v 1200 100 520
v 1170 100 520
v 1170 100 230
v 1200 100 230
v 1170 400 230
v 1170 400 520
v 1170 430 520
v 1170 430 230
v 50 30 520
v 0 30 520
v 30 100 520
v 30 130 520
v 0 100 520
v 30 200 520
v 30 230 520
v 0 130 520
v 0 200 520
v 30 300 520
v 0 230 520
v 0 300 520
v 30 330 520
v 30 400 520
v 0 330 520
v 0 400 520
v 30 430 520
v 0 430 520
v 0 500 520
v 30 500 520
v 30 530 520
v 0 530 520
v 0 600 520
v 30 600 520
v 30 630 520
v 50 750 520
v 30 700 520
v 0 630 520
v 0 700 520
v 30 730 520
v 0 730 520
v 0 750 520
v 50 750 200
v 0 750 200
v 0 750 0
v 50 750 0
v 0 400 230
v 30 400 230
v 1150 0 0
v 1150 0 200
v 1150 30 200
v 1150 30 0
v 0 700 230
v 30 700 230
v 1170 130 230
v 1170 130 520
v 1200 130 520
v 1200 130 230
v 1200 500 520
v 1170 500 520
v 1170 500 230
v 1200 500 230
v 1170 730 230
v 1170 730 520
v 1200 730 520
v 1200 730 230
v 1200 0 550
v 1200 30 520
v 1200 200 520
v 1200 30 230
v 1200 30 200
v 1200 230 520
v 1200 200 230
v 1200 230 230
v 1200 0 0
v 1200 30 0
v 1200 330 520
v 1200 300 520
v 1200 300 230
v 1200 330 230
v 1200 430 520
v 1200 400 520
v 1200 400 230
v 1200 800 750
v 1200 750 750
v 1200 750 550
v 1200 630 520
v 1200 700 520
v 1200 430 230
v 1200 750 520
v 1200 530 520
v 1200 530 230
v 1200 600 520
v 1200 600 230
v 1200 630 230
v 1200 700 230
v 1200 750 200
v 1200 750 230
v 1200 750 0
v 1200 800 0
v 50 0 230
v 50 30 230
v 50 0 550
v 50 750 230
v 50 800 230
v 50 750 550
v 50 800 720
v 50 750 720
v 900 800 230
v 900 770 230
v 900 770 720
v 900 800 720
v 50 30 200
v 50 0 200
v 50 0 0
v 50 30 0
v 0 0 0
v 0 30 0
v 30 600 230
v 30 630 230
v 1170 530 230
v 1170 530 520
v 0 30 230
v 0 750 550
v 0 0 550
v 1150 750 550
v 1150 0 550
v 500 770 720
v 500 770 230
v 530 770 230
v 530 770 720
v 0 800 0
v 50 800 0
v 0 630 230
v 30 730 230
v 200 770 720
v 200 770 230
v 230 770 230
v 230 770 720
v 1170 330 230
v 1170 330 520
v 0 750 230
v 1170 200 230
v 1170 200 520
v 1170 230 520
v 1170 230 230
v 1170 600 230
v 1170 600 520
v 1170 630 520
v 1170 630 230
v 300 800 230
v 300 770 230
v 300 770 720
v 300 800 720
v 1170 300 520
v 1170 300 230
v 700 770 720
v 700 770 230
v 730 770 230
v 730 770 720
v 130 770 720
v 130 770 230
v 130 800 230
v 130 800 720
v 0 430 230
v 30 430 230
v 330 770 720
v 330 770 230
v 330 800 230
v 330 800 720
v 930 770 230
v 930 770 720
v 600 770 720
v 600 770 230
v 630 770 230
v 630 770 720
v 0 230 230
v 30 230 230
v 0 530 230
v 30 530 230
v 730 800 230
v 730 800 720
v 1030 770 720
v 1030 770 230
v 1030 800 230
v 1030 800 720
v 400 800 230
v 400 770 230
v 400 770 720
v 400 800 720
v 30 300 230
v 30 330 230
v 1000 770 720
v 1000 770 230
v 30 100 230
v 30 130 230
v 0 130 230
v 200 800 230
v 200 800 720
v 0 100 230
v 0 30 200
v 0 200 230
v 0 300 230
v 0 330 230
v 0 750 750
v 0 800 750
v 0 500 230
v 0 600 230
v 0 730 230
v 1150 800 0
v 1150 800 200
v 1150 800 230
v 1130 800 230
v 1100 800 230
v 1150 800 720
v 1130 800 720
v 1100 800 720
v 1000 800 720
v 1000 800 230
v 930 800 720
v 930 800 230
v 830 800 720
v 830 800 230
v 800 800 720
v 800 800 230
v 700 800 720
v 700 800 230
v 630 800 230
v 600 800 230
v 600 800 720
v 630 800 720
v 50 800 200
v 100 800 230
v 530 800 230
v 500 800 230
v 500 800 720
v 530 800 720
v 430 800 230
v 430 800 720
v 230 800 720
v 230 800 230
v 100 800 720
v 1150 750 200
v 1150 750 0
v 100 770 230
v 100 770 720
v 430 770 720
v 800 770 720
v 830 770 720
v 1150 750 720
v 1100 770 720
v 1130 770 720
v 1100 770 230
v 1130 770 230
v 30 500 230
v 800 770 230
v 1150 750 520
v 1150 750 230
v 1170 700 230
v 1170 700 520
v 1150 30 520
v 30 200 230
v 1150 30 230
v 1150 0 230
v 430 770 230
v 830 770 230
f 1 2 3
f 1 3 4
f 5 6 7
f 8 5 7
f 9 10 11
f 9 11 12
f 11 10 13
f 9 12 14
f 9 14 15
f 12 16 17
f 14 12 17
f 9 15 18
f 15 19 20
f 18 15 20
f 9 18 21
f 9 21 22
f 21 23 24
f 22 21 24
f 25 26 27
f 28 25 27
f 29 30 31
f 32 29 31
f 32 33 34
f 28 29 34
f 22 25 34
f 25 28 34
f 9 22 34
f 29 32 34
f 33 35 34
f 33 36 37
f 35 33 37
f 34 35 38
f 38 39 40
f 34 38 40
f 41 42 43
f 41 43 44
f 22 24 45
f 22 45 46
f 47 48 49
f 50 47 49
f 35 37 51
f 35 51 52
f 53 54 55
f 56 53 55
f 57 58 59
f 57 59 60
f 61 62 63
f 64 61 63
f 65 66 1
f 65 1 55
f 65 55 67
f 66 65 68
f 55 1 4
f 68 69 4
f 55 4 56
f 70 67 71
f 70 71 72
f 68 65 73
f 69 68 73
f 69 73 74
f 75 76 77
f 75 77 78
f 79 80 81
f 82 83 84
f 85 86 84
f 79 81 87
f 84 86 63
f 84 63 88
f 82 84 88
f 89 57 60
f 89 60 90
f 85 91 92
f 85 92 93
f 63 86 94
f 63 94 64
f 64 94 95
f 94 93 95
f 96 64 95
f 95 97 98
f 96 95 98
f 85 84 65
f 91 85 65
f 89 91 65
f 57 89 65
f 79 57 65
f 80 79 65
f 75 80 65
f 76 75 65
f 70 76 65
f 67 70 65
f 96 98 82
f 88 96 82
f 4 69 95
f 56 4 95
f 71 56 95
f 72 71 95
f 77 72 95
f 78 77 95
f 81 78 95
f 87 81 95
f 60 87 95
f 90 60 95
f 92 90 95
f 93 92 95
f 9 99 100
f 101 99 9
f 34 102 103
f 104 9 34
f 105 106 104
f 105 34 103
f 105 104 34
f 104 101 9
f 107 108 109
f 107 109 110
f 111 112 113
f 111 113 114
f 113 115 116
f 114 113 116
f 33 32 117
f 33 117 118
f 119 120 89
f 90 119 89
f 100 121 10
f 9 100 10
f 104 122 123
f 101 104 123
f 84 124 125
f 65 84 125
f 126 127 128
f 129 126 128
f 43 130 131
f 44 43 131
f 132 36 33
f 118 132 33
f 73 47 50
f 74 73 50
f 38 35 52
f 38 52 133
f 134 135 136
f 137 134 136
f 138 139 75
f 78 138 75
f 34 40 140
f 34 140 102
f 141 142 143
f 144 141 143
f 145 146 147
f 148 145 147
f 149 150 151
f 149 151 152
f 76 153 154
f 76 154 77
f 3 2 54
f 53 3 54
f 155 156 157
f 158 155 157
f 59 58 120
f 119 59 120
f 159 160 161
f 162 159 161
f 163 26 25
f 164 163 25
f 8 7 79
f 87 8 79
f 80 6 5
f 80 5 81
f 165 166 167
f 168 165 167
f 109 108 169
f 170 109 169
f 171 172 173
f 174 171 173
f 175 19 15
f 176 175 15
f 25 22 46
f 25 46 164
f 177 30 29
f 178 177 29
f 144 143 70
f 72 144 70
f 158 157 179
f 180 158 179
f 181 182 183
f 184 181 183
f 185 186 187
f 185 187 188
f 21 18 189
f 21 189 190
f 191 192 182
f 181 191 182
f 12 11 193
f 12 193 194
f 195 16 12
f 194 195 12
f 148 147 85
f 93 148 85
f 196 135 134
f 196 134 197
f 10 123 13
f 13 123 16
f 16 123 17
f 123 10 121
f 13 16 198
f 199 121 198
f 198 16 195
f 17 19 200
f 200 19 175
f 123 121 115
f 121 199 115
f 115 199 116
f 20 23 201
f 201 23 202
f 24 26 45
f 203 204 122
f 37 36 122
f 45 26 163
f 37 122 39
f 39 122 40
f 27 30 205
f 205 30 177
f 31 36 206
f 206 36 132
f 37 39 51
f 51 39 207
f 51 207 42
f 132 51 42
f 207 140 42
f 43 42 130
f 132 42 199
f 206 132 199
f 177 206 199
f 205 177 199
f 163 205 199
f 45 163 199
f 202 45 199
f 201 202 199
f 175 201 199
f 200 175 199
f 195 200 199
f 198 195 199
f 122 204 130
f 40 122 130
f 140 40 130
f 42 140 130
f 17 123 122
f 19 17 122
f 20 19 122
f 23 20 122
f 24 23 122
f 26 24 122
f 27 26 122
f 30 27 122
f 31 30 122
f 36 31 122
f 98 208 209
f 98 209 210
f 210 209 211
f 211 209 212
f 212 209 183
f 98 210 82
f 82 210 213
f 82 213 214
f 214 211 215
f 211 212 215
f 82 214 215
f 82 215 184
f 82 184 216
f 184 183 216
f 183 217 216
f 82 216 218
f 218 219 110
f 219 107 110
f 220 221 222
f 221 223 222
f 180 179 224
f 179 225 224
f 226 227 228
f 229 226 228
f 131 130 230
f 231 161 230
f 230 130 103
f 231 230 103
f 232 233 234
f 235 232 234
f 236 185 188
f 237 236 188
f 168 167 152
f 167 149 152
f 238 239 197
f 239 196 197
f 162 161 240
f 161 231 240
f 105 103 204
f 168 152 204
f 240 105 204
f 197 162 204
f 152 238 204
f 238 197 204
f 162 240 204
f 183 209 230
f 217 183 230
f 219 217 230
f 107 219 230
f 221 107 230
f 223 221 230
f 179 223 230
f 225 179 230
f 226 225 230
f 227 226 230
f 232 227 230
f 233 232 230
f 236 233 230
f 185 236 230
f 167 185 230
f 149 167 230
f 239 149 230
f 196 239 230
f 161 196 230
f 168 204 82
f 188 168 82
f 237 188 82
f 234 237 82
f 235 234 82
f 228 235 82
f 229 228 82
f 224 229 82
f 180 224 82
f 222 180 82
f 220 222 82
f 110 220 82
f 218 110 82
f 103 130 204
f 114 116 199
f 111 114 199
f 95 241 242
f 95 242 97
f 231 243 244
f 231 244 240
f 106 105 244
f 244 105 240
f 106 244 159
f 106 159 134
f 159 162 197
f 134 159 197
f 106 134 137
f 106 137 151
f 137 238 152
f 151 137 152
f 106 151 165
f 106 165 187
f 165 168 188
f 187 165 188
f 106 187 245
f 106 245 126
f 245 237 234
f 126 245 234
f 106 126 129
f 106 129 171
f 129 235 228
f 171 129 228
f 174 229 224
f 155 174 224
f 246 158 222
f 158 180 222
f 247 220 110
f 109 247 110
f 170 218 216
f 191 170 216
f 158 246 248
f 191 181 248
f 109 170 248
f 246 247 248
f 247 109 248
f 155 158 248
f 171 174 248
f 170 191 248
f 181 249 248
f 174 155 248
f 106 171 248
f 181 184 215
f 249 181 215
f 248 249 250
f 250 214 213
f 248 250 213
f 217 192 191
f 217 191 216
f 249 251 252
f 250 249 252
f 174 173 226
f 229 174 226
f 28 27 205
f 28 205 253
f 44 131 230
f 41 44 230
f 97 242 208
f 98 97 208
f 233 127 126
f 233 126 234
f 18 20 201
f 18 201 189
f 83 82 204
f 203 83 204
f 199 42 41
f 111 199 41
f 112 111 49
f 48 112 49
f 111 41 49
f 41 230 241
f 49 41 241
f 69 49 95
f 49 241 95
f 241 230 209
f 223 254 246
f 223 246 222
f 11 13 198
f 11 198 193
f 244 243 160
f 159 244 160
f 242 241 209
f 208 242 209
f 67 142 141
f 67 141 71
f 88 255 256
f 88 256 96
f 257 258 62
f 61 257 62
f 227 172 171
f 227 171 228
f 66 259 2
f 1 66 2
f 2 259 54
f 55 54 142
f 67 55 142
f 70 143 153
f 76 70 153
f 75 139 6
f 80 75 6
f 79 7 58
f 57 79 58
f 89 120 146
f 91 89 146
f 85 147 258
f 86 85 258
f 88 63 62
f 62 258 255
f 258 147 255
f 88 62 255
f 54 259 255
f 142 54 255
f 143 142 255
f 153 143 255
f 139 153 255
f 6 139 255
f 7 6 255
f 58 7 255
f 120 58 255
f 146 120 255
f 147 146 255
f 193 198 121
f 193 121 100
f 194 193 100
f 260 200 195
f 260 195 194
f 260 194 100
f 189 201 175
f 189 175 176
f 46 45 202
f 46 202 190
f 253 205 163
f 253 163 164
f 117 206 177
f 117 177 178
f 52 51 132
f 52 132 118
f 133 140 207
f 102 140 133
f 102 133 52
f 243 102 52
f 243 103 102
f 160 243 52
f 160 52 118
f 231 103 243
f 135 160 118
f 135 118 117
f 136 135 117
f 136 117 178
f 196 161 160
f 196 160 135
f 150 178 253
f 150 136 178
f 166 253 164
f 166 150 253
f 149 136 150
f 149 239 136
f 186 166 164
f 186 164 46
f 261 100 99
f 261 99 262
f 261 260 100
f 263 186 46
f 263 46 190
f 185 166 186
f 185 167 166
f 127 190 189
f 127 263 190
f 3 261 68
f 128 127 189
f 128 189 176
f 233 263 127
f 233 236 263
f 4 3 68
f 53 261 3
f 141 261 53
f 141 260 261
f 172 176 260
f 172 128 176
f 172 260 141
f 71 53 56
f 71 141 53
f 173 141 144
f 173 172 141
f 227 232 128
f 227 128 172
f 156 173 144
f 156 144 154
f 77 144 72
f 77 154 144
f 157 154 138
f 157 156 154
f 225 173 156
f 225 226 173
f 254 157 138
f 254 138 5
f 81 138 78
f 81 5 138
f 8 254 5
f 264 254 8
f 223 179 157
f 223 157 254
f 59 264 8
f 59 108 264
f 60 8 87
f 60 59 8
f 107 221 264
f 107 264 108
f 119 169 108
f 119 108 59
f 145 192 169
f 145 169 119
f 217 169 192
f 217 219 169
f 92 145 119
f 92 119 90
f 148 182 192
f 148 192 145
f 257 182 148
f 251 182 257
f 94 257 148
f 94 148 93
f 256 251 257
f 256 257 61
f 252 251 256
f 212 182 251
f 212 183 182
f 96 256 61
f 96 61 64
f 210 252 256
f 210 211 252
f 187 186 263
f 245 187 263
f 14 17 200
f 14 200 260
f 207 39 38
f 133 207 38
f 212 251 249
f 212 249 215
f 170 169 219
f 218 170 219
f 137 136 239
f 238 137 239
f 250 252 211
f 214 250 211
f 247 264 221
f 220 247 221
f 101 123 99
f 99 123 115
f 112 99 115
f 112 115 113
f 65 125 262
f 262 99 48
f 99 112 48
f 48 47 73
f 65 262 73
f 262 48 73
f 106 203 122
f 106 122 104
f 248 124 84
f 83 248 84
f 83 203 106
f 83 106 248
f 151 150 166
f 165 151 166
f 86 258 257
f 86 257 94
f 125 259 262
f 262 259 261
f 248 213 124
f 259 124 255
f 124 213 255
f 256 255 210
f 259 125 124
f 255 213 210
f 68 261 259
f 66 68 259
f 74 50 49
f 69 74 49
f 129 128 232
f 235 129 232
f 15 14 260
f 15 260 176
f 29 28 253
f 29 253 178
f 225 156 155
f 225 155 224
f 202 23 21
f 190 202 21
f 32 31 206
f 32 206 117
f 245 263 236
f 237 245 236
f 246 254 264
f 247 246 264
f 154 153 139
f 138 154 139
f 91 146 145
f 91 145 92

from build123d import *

# Parameters (mm, degrees)
EXTRUDE_DEPTH    = 50
SKETCH001_W      = 1200
SKETCH001_H      = 800
EXTRUDE001_DEPTH = 30
EXTRUDE002_DEPTH = 50
SKETCH003_W      = 30
SKETCH003_H      = 30
EXTRUDE003_DEPTH = 290
ARRAY_Y_COUNT    = 8
ARRAY_Y_PITCH    = 100
EXTRUDE004_DEPTH = 490
ARRAY001_X_COUNT = 12
ARRAY001_X_PITCH = 100


with BuildPart() as extrude_body:
    # Sketch → Extrude (new body)
    with BuildSketch(Plane.YZ):
        Polygon((0, 0), (30, 0), (30, 520), (770, 520), (770, 0), (800, 0), (800, 550), (0, 550), align=None)
    extrude(amount=EXTRUDE_DEPTH)


with BuildPart() as extrude004:
    # Sketch001 → Extrude001 (new body)
    with BuildSketch(Plane.XY):
        with Locations((600, 400)):
            Rectangle(SKETCH001_W, SKETCH001_H)
    extrude(amount=EXTRUDE001_DEPTH)


with BuildPart() as extrude004_1:
    # Extrude001 placement: moved
    add(extrude004.part.moved(Location((0, 0, 200))))


with BuildPart() as extrude002:
    # Sketch002 → Extrude002 (new body)
    with BuildSketch(Plane.XZ):
        Polygon((0, 0), (50, 0), (50, 720), (1150, 720), (1150, 0), (1200, 0), (1200, 750), (0, 750), align=None)
    extrude(amount=EXTRUDE002_DEPTH)


with BuildPart() as extrude002_1:
    # Extrude002 placement: moved
    add(extrude002.part.moved(Location((0, 800, 0))))


with BuildPart() as array:
    # Sketch003 → Extrude003 (new body)
    with BuildSketch(Plane.XY):
        with Locations((15, 15)):
            Rectangle(SKETCH003_W, SKETCH003_H)
    extrude(amount=EXTRUDE003_DEPTH)

    # Array Y: Array ×8


with BuildPart() as array_1:
    add(array.part)
    with Locations(*[(0, i * ARRAY_Y_PITCH, 0) for i in range(1, ARRAY_Y_COUNT)]):
        add(array.part)


with BuildPart() as array_2:
    # Array placement: moved
    add(array_1.part.moved(Location((0, 0, 230))))


with BuildPart() as array001:
    # Clone001 base: copy of Array
    add(array_2.part)


with BuildPart() as array001_1:
    # Clone001 placement: moved
    add(array001.part.moved(Location((1170, 0, 0))))


with BuildPart() as array002:
    # Sketch003 → Extrude004 (new body)
    with BuildSketch(Plane.XY):
        with Locations((15, 15)):
            Rectangle(SKETCH003_W, SKETCH003_H)
    extrude(amount=EXTRUDE004_DEPTH)

    # Array001 X: Array002 ×12


with BuildPart() as array002_1:
    add(array002.part)
    with Locations(*[(i * ARRAY001_X_PITCH, 0, 0) for i in range(1, ARRAY001_X_COUNT)]):
        add(array002.part)


with BuildPart() as array002_2:
    # Array001 placement: moved
    add(array002_1.part.moved(Location((0, 770, 230))))


with BuildPart() as fusion:
    # Clone base: copy of Extrude body
    add(extrude_body.part)


with BuildPart() as fusion_1:
    # Clone placement: moved
    add(fusion.part.moved(Location((1150, 0, 0))))

    # Fusion: union Extrude body, Extrude004, Extrude002, Array, Array001, Array002
    add(extrude_body.part)
    add(extrude004_1.part)
    add(extrude002_1.part)
    add(array_2.part)
    add(array001_1.part)
    add(array002_2.part)


solid = fusion_1.part
